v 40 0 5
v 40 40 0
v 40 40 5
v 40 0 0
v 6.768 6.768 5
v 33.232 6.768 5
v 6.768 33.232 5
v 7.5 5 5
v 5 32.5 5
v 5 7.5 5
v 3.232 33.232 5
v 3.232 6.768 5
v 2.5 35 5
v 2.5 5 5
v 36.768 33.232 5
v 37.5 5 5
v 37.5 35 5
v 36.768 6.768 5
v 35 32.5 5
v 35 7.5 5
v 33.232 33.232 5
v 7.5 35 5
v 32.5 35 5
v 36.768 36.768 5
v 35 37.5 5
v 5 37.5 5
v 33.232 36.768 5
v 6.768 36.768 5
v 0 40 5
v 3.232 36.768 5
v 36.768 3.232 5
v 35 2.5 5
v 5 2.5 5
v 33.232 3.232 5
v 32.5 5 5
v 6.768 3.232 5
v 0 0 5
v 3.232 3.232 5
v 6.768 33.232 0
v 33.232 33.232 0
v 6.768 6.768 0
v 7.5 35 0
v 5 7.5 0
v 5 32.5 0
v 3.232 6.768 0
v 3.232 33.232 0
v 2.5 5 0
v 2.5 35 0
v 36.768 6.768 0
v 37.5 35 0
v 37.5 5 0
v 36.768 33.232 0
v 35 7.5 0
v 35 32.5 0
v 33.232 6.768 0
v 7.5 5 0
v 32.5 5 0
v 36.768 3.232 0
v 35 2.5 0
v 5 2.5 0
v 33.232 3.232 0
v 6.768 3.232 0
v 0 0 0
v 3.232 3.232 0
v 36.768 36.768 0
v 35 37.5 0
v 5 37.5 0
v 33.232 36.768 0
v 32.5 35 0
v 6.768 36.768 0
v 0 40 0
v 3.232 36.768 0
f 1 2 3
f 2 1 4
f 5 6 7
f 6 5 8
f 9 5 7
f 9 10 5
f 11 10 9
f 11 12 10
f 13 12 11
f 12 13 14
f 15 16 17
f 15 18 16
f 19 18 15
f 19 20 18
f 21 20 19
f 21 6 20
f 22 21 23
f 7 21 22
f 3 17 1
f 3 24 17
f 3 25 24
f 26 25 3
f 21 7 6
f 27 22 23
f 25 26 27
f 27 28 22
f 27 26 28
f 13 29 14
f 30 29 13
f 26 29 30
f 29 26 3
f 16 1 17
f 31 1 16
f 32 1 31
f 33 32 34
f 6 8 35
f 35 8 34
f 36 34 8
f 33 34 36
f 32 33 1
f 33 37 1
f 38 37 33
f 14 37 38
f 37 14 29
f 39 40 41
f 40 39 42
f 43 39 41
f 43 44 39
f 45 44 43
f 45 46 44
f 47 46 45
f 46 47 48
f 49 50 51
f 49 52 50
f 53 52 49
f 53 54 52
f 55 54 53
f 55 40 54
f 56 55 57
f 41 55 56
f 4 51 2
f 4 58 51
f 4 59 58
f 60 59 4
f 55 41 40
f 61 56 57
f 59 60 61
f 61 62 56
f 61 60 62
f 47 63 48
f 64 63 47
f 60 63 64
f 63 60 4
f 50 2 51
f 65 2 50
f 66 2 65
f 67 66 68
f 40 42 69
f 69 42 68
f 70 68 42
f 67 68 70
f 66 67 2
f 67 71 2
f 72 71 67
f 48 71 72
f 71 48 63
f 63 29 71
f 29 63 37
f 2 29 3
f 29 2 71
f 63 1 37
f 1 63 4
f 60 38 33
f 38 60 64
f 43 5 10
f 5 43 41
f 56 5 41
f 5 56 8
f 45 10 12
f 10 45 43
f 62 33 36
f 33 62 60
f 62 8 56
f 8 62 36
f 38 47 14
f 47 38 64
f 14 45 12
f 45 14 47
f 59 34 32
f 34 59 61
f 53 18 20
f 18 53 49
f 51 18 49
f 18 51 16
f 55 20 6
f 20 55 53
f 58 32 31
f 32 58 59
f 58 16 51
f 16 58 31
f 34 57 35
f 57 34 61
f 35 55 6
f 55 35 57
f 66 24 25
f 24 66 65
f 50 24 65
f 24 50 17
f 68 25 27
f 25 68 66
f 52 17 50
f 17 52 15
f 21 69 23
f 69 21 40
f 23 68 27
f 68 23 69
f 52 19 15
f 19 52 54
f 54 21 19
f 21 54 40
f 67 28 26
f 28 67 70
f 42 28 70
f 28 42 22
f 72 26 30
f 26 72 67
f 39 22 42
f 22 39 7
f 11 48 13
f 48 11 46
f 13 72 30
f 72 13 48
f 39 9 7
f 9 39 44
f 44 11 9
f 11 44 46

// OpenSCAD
$holeRadius = 2.5;
$tabletSize = 40;
$holeDistFromEdge = 5;
$tabletThick = 5;

difference(){
    cube([$tabletSize, $tabletSize, $tabletThick], false);
    translate ([$holeDistFromEdge, $holeDistFromEdge, -0.01])
        cylinder(r=$holeRadius, h=$tabletThick + 0.02);
    
    translate ([$tabletSize - $holeDistFromEdge, $holeDistFromEdge, -0.01])
    cylinder(r=$holeRadius, h=$tabletThick + 0.05);
    
    translate ([$tabletSize - $holeDistFromEdge, $tabletSize - $holeDistFromEdge, -0.01])
    cylinder(r=$holeRadius, h=$tabletThick + 0.05);
    
    translate ([$holeDistFromEdge, $tabletSize - $holeDistFromEdge, -0.01])
    cylinder(r=$holeRadius, h=$tabletThick + 0.05);
}
